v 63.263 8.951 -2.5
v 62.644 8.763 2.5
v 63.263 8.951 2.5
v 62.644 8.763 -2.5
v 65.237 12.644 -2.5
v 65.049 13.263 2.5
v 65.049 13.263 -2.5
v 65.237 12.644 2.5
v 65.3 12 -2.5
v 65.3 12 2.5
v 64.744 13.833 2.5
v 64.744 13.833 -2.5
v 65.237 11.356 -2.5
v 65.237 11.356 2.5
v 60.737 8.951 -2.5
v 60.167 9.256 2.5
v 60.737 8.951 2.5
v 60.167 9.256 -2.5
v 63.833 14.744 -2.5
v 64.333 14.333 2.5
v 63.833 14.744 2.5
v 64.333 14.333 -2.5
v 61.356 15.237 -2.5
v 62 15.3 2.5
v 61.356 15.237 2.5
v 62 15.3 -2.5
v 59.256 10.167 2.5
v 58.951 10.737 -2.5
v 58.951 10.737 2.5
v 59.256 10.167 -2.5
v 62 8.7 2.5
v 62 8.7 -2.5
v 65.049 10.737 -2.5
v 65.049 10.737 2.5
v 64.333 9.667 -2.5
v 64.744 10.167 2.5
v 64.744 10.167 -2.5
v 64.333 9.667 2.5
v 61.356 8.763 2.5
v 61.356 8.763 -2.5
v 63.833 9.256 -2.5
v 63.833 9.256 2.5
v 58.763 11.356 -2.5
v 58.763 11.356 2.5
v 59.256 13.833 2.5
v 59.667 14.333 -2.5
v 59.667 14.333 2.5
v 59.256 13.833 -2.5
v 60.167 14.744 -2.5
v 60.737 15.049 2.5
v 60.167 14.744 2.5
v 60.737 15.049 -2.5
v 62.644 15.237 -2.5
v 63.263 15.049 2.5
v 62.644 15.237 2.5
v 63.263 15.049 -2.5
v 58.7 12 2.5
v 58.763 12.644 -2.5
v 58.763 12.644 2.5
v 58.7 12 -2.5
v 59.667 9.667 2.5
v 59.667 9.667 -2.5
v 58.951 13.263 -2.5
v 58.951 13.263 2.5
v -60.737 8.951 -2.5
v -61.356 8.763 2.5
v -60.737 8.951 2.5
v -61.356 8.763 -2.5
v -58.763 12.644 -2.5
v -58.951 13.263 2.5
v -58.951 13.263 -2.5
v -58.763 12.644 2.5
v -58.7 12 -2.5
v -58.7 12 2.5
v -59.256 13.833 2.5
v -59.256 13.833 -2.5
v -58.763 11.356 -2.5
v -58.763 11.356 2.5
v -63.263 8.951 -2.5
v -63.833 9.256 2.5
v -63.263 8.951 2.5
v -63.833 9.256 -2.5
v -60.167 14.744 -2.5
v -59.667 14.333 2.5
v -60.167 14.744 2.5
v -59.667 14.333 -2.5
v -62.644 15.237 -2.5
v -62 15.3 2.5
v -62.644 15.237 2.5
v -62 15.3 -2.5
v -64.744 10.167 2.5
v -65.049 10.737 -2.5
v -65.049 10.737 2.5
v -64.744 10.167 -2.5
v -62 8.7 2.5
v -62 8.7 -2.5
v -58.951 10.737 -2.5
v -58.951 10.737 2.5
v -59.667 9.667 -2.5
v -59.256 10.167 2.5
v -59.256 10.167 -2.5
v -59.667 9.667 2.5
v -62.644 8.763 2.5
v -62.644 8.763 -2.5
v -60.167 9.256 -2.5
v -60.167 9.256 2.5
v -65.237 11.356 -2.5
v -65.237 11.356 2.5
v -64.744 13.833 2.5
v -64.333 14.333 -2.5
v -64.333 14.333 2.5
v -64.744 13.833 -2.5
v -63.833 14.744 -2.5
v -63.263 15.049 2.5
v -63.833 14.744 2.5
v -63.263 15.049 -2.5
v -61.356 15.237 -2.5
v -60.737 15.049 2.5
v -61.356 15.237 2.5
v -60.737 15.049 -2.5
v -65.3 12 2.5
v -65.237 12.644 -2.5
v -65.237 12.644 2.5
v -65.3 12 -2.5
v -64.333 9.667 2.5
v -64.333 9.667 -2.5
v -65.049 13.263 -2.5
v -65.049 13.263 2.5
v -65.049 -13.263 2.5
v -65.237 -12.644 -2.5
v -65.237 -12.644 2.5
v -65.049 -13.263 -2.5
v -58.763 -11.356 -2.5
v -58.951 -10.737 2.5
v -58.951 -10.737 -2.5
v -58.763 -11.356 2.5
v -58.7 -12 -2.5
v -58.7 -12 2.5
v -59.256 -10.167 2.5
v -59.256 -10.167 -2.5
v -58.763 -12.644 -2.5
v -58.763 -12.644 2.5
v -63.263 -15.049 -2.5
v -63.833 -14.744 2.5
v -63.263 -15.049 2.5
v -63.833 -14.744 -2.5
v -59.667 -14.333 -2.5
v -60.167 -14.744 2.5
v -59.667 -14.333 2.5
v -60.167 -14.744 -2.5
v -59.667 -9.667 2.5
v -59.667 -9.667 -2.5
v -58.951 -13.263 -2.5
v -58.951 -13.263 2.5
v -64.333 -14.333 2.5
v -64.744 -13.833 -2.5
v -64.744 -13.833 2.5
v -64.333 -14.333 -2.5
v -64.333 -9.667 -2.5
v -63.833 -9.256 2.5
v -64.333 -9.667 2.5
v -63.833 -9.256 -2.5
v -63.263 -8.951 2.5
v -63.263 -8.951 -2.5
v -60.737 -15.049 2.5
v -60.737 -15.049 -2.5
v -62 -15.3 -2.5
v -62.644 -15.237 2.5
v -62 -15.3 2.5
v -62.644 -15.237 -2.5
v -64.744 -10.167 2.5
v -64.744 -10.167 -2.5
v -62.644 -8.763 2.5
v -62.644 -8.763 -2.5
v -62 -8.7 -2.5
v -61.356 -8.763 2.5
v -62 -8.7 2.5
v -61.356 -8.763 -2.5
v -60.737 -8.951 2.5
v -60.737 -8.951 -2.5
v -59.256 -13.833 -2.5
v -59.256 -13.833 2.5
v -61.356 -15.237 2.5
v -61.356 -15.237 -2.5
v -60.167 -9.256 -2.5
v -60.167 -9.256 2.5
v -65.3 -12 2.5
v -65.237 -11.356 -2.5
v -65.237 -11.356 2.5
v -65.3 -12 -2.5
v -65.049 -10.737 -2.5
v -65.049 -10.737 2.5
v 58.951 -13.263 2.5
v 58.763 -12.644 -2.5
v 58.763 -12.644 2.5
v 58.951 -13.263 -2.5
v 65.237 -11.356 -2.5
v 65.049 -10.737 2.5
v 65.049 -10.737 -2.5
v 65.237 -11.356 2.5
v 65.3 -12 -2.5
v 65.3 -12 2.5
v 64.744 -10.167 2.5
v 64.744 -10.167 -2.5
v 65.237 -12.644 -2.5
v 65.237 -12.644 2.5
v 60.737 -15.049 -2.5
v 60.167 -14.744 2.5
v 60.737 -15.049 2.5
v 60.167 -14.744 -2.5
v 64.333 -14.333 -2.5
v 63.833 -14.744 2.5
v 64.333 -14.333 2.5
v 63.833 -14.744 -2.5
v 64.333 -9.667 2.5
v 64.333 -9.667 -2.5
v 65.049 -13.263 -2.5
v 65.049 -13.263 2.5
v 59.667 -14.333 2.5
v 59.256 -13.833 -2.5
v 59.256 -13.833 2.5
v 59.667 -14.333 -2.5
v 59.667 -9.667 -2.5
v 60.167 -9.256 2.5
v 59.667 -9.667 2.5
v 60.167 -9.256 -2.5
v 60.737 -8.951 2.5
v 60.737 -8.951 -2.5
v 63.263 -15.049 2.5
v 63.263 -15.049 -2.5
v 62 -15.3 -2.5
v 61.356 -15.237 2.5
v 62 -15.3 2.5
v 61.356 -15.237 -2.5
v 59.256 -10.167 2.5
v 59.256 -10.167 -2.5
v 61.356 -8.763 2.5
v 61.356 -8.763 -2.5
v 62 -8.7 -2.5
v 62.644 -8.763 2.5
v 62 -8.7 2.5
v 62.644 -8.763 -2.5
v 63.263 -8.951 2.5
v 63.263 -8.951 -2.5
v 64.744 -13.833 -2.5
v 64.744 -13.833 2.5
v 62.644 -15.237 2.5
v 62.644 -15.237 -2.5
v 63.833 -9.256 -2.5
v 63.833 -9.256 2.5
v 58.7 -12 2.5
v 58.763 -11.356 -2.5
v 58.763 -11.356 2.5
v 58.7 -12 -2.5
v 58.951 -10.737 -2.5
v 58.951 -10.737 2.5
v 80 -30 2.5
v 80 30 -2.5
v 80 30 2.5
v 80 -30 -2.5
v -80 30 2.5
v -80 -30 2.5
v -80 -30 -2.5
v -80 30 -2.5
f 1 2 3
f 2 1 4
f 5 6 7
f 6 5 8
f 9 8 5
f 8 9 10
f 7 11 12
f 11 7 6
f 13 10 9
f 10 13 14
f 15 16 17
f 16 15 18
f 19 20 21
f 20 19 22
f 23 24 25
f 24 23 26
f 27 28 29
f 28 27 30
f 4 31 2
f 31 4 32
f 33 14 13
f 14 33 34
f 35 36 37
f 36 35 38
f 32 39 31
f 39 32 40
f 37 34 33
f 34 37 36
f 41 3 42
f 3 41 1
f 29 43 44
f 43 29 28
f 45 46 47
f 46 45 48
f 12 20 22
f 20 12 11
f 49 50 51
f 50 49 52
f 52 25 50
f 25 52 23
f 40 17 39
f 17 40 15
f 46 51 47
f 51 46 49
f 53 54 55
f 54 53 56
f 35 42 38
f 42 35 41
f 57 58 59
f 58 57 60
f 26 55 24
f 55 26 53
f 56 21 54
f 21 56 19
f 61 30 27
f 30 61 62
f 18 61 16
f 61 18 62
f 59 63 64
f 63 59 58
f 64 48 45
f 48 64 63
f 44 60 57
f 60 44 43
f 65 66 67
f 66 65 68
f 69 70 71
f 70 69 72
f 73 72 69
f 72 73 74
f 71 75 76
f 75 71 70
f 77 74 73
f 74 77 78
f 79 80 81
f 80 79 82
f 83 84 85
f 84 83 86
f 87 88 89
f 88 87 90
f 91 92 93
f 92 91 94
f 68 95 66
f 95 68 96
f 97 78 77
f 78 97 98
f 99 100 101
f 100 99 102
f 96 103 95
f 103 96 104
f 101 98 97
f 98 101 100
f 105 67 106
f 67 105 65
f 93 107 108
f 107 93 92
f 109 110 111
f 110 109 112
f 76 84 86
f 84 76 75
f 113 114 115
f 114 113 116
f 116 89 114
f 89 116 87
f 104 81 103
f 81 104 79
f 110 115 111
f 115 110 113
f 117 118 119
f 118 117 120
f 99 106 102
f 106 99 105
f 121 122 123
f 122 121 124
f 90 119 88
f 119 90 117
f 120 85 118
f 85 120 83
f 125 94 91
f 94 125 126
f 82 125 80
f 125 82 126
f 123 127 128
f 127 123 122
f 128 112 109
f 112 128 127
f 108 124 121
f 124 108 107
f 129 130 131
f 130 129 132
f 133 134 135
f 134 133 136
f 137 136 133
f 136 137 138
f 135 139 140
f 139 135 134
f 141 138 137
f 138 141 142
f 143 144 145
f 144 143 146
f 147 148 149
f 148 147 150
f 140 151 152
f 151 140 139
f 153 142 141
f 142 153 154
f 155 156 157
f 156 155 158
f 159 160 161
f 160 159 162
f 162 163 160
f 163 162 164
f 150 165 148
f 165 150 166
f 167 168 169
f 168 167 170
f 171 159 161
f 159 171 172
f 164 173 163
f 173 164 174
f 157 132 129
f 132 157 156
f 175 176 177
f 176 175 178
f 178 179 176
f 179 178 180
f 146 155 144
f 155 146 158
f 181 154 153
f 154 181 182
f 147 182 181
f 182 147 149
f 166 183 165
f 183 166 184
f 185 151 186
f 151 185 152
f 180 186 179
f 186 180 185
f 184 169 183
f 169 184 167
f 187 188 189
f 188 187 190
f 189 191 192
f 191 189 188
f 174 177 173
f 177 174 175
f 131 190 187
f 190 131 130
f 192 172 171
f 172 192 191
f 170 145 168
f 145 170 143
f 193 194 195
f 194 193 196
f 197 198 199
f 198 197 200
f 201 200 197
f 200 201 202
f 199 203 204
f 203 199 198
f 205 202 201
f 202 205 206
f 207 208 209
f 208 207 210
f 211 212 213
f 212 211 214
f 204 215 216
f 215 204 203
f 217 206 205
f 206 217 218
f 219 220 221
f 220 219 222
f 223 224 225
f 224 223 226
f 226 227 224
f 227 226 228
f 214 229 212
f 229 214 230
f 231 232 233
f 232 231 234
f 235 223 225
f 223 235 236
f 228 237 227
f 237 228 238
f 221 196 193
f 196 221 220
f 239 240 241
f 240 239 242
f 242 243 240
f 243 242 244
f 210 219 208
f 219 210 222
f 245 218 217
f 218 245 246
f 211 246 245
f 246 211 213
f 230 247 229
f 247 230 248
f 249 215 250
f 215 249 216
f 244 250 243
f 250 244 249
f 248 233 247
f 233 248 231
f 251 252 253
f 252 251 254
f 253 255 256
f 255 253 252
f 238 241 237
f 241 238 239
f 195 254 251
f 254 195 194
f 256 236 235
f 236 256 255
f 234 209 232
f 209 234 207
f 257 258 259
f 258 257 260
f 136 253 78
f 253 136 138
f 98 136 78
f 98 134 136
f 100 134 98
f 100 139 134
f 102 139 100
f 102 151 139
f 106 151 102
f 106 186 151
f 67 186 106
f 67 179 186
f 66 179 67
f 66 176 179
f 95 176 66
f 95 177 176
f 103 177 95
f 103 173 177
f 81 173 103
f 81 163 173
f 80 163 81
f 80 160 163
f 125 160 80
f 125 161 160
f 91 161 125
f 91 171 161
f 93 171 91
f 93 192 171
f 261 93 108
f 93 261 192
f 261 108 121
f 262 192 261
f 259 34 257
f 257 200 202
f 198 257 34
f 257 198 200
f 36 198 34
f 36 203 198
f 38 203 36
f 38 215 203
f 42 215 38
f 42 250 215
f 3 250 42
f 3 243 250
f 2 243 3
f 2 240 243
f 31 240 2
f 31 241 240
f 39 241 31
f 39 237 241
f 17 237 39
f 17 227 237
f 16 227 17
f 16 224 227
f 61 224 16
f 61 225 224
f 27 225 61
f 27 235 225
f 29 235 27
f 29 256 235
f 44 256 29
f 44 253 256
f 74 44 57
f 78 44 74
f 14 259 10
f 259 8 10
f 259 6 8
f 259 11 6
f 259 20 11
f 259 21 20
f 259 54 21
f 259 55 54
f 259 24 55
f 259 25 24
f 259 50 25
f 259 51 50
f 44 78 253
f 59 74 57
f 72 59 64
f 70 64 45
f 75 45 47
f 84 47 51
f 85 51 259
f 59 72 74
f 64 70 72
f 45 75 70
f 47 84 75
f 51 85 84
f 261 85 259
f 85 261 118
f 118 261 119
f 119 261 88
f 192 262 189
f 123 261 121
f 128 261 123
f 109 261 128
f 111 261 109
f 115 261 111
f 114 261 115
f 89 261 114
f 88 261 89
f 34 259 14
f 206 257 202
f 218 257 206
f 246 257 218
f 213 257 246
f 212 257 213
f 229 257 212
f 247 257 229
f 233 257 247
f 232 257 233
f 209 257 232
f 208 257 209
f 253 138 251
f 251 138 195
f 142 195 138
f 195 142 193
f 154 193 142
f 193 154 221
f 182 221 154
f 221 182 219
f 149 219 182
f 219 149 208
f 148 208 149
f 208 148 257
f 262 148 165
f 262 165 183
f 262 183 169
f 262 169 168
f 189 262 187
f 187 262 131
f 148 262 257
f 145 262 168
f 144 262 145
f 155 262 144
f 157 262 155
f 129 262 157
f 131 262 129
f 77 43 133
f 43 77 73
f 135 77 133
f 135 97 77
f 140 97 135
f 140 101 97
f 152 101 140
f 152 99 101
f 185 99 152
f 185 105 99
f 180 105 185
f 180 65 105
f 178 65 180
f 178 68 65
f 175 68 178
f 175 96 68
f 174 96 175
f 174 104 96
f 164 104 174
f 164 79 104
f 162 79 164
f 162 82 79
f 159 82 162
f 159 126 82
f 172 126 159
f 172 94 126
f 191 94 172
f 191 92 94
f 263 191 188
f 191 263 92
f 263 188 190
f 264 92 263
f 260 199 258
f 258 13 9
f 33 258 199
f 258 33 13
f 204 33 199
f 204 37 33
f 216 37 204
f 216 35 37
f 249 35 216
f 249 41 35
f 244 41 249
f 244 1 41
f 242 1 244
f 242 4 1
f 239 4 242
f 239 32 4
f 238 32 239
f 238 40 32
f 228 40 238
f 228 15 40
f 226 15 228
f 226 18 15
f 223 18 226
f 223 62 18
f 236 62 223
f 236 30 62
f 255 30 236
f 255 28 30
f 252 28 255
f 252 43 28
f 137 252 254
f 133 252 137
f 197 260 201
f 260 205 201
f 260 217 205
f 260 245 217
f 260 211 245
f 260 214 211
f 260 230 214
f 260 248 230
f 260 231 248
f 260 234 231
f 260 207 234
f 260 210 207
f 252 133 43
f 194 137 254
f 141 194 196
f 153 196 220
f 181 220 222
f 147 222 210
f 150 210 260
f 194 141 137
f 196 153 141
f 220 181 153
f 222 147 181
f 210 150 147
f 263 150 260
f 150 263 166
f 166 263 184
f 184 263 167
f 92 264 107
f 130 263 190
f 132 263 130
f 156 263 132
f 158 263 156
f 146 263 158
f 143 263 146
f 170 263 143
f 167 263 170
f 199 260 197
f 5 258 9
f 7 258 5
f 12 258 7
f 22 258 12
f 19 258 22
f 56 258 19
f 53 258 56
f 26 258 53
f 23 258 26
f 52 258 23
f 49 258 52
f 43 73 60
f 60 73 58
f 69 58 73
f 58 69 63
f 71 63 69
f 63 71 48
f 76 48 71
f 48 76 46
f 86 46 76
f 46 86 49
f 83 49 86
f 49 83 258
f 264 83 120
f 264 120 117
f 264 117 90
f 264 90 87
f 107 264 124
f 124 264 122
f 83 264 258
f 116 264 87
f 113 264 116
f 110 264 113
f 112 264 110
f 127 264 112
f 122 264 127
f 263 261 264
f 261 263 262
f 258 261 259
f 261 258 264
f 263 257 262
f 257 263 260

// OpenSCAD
$fn = 32;

// ----------------------------------------------------------------------
// Corner plate 160 x 60 x 5
// 4 holes, centres taken from the edge offset
// ----------------------------------------------------------------------

// --- parameters (mm) ---
plate = [160, 60, 5];  // overall size (x, y, z)
holes = 4;             // number of holes the drawing asks for
hole_d = 6.6;          // hole diameter
edge = 18;             // hole centre offset from the plate edge

// --- derived feature positions (mm) ---
corner_x = plate[0] / 2 - edge;  // = 62   corner hole X
corner_y = plate[1] / 2 - edge;  // = 12   corner hole Y
feature_centers = [
  [corner_x, corner_y],
  [-corner_x, corner_y],
  [-corner_x, -corner_y],
  [corner_x, -corner_y]
];   // hole centres the loop below drills

// plate outline, every hole drilled through with the same cutters
difference() {
  cube(plate, center = true);
  for (centre = feature_centers)
    translate([centre[0], centre[1], 0])
      cylinder(d = hole_d, h = plate[2] + 2, center = true);
}
